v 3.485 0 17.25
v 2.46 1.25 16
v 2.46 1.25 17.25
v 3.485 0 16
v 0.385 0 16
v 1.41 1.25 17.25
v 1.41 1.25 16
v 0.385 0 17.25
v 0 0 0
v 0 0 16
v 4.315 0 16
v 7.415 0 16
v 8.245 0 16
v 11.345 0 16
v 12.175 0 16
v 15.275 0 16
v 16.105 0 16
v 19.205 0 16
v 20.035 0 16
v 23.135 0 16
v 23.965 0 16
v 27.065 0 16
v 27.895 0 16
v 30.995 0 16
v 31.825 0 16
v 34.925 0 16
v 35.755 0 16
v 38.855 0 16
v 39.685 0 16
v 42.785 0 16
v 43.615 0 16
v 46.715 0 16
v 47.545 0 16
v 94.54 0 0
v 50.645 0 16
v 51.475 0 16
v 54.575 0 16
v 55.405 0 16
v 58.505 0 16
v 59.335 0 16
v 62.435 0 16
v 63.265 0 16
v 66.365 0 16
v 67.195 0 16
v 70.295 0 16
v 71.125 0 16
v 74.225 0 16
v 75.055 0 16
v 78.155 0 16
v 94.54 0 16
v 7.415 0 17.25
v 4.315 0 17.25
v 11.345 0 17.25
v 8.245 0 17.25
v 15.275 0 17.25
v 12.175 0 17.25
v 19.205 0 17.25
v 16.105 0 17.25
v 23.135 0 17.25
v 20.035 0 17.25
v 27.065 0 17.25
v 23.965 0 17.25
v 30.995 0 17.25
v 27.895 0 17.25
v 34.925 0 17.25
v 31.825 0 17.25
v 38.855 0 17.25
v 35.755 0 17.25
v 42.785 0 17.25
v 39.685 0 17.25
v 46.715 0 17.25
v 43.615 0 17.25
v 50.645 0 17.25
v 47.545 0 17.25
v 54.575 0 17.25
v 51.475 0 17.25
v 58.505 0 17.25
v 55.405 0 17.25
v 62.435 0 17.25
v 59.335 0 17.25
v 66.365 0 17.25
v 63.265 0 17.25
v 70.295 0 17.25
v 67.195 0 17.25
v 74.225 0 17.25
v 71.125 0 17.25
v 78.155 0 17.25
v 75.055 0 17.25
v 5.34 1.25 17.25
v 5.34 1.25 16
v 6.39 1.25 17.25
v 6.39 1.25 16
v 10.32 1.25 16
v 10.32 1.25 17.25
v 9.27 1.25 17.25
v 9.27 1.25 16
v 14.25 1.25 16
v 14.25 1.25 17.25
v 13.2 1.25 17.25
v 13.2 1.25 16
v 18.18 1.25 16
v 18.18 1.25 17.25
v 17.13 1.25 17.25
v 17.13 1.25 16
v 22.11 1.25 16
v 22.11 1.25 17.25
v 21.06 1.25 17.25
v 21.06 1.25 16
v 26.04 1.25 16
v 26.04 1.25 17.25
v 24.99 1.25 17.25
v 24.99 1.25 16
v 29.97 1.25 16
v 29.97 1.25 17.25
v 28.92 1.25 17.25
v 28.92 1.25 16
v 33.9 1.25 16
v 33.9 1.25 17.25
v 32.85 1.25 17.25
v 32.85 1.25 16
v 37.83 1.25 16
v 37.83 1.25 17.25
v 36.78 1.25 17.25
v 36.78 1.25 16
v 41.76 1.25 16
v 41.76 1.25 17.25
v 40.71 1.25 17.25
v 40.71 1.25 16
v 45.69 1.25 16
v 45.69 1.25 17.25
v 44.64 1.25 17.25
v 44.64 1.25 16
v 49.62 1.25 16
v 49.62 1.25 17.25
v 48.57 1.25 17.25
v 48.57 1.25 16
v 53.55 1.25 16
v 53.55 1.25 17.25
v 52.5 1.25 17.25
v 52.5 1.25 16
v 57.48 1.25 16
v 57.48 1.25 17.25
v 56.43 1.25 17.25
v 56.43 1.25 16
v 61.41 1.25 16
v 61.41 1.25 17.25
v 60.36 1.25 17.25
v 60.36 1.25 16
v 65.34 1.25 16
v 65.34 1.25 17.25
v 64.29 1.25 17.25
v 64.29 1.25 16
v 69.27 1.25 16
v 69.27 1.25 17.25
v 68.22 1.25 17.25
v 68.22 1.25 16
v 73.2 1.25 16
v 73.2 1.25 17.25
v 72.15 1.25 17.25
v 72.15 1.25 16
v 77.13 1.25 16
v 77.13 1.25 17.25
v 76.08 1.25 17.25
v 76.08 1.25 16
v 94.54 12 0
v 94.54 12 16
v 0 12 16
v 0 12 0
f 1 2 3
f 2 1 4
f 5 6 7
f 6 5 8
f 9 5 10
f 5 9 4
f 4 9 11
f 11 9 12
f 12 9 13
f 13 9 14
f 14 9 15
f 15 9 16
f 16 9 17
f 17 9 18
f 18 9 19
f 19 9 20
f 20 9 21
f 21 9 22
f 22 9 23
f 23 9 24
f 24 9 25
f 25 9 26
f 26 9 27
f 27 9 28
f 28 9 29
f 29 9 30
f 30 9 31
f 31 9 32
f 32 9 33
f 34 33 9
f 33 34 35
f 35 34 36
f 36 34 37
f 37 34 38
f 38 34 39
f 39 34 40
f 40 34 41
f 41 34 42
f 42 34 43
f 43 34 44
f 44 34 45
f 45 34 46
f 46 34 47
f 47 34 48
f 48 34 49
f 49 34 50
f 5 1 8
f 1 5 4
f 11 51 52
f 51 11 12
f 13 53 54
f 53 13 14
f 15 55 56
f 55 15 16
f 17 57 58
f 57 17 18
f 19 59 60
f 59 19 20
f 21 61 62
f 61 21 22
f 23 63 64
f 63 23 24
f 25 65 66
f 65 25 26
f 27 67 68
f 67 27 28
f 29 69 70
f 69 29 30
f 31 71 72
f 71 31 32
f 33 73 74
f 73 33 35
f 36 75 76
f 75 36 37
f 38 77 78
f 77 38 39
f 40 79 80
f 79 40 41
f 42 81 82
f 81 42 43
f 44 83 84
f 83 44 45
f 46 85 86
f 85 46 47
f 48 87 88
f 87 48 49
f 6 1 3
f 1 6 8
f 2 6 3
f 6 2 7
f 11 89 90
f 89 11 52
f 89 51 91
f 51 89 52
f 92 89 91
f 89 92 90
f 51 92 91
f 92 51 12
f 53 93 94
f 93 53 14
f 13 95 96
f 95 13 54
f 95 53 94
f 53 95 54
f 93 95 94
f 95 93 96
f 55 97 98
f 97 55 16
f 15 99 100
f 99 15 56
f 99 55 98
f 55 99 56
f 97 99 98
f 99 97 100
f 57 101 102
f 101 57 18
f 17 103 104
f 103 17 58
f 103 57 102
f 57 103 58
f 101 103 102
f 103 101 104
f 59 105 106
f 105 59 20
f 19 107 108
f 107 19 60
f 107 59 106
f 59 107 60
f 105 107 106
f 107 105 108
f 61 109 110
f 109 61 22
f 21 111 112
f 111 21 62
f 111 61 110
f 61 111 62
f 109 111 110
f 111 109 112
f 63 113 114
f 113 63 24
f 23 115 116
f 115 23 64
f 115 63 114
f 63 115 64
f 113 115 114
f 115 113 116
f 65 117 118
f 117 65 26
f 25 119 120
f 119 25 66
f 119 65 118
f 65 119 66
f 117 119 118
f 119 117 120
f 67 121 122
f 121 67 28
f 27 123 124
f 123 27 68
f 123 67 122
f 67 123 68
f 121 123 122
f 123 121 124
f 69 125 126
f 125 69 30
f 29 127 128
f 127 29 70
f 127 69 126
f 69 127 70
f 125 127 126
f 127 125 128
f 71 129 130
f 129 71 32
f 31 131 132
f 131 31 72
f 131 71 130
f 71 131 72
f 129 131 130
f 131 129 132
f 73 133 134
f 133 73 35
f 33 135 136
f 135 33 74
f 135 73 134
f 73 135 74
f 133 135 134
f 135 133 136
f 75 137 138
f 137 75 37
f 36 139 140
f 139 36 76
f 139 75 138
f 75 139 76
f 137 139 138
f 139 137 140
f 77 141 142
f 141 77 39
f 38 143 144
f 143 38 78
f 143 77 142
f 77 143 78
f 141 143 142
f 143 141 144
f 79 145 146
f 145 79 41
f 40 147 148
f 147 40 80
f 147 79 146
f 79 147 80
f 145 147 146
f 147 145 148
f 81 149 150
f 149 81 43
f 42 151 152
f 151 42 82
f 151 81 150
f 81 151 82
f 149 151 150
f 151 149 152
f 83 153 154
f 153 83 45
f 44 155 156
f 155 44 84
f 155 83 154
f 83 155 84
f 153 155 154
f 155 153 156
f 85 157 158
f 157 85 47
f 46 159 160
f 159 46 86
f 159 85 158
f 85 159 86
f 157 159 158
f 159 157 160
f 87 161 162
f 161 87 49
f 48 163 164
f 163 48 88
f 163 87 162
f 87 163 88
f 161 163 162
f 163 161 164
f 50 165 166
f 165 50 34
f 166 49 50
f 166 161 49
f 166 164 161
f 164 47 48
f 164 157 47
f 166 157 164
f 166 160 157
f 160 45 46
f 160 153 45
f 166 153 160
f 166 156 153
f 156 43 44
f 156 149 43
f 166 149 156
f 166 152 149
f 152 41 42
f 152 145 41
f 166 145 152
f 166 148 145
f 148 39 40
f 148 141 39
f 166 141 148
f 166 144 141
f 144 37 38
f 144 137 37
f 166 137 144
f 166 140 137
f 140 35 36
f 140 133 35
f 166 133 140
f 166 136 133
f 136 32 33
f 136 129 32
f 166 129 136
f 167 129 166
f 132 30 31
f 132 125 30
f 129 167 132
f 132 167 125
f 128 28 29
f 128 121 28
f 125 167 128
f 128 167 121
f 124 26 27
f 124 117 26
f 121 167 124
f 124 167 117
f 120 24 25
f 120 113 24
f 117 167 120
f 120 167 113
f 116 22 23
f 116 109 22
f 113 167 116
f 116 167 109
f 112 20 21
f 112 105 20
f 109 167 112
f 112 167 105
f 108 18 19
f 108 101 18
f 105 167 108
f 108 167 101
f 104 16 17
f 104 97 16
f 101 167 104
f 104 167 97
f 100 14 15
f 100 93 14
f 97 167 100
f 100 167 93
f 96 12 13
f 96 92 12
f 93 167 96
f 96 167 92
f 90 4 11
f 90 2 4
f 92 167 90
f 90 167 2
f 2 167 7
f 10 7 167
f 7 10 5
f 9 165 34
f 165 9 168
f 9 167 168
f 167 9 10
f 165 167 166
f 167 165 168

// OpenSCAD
$fn = 32;

// ----------------------------------------------------------------------
// Gear rack: m=1.25 z=20, 94.54 x 12 x 17.25 mm
// ----------------------------------------------------------------------

// --- parameters (mm) ---
bar_len = 94.54;          // rack length, X
bar_w = 12;               // rack width, Y
bar_h = 17.25;            // overall height, Z
gear_module = 1.25;       // module
base_t = 16;              // tooth root line height
pitch = 3.93;             // circular pitch
tip_w = 1.05;             // tooth thickness at the tip
root_w = 3.1;             // tooth thickness at the root line
sink = 0.6;               // tooth root overlap into the body

tooth_span = 78.54;

module tooth(x0) {
  /* 20 deg flank profile, sunk into the body for a positive overlap */
  translate([x0, 0, base_t - sink])
    linear_extrude(height = bar_h - base_t + sink)
      polygon(points = [[-root_w / 2, 0], [root_w / 2, 0],
                        [tip_w / 2, bar_h - base_t],
                        [-tip_w / 2, bar_h - base_t]]);
}

difference() {
  union() {
    cube([bar_len, bar_w, base_t]);
    for (i = [0 : 20 - 1])
      tooth((i + 0.5) * pitch + (tooth_span - 20 * pitch) / 2);
  }
}
